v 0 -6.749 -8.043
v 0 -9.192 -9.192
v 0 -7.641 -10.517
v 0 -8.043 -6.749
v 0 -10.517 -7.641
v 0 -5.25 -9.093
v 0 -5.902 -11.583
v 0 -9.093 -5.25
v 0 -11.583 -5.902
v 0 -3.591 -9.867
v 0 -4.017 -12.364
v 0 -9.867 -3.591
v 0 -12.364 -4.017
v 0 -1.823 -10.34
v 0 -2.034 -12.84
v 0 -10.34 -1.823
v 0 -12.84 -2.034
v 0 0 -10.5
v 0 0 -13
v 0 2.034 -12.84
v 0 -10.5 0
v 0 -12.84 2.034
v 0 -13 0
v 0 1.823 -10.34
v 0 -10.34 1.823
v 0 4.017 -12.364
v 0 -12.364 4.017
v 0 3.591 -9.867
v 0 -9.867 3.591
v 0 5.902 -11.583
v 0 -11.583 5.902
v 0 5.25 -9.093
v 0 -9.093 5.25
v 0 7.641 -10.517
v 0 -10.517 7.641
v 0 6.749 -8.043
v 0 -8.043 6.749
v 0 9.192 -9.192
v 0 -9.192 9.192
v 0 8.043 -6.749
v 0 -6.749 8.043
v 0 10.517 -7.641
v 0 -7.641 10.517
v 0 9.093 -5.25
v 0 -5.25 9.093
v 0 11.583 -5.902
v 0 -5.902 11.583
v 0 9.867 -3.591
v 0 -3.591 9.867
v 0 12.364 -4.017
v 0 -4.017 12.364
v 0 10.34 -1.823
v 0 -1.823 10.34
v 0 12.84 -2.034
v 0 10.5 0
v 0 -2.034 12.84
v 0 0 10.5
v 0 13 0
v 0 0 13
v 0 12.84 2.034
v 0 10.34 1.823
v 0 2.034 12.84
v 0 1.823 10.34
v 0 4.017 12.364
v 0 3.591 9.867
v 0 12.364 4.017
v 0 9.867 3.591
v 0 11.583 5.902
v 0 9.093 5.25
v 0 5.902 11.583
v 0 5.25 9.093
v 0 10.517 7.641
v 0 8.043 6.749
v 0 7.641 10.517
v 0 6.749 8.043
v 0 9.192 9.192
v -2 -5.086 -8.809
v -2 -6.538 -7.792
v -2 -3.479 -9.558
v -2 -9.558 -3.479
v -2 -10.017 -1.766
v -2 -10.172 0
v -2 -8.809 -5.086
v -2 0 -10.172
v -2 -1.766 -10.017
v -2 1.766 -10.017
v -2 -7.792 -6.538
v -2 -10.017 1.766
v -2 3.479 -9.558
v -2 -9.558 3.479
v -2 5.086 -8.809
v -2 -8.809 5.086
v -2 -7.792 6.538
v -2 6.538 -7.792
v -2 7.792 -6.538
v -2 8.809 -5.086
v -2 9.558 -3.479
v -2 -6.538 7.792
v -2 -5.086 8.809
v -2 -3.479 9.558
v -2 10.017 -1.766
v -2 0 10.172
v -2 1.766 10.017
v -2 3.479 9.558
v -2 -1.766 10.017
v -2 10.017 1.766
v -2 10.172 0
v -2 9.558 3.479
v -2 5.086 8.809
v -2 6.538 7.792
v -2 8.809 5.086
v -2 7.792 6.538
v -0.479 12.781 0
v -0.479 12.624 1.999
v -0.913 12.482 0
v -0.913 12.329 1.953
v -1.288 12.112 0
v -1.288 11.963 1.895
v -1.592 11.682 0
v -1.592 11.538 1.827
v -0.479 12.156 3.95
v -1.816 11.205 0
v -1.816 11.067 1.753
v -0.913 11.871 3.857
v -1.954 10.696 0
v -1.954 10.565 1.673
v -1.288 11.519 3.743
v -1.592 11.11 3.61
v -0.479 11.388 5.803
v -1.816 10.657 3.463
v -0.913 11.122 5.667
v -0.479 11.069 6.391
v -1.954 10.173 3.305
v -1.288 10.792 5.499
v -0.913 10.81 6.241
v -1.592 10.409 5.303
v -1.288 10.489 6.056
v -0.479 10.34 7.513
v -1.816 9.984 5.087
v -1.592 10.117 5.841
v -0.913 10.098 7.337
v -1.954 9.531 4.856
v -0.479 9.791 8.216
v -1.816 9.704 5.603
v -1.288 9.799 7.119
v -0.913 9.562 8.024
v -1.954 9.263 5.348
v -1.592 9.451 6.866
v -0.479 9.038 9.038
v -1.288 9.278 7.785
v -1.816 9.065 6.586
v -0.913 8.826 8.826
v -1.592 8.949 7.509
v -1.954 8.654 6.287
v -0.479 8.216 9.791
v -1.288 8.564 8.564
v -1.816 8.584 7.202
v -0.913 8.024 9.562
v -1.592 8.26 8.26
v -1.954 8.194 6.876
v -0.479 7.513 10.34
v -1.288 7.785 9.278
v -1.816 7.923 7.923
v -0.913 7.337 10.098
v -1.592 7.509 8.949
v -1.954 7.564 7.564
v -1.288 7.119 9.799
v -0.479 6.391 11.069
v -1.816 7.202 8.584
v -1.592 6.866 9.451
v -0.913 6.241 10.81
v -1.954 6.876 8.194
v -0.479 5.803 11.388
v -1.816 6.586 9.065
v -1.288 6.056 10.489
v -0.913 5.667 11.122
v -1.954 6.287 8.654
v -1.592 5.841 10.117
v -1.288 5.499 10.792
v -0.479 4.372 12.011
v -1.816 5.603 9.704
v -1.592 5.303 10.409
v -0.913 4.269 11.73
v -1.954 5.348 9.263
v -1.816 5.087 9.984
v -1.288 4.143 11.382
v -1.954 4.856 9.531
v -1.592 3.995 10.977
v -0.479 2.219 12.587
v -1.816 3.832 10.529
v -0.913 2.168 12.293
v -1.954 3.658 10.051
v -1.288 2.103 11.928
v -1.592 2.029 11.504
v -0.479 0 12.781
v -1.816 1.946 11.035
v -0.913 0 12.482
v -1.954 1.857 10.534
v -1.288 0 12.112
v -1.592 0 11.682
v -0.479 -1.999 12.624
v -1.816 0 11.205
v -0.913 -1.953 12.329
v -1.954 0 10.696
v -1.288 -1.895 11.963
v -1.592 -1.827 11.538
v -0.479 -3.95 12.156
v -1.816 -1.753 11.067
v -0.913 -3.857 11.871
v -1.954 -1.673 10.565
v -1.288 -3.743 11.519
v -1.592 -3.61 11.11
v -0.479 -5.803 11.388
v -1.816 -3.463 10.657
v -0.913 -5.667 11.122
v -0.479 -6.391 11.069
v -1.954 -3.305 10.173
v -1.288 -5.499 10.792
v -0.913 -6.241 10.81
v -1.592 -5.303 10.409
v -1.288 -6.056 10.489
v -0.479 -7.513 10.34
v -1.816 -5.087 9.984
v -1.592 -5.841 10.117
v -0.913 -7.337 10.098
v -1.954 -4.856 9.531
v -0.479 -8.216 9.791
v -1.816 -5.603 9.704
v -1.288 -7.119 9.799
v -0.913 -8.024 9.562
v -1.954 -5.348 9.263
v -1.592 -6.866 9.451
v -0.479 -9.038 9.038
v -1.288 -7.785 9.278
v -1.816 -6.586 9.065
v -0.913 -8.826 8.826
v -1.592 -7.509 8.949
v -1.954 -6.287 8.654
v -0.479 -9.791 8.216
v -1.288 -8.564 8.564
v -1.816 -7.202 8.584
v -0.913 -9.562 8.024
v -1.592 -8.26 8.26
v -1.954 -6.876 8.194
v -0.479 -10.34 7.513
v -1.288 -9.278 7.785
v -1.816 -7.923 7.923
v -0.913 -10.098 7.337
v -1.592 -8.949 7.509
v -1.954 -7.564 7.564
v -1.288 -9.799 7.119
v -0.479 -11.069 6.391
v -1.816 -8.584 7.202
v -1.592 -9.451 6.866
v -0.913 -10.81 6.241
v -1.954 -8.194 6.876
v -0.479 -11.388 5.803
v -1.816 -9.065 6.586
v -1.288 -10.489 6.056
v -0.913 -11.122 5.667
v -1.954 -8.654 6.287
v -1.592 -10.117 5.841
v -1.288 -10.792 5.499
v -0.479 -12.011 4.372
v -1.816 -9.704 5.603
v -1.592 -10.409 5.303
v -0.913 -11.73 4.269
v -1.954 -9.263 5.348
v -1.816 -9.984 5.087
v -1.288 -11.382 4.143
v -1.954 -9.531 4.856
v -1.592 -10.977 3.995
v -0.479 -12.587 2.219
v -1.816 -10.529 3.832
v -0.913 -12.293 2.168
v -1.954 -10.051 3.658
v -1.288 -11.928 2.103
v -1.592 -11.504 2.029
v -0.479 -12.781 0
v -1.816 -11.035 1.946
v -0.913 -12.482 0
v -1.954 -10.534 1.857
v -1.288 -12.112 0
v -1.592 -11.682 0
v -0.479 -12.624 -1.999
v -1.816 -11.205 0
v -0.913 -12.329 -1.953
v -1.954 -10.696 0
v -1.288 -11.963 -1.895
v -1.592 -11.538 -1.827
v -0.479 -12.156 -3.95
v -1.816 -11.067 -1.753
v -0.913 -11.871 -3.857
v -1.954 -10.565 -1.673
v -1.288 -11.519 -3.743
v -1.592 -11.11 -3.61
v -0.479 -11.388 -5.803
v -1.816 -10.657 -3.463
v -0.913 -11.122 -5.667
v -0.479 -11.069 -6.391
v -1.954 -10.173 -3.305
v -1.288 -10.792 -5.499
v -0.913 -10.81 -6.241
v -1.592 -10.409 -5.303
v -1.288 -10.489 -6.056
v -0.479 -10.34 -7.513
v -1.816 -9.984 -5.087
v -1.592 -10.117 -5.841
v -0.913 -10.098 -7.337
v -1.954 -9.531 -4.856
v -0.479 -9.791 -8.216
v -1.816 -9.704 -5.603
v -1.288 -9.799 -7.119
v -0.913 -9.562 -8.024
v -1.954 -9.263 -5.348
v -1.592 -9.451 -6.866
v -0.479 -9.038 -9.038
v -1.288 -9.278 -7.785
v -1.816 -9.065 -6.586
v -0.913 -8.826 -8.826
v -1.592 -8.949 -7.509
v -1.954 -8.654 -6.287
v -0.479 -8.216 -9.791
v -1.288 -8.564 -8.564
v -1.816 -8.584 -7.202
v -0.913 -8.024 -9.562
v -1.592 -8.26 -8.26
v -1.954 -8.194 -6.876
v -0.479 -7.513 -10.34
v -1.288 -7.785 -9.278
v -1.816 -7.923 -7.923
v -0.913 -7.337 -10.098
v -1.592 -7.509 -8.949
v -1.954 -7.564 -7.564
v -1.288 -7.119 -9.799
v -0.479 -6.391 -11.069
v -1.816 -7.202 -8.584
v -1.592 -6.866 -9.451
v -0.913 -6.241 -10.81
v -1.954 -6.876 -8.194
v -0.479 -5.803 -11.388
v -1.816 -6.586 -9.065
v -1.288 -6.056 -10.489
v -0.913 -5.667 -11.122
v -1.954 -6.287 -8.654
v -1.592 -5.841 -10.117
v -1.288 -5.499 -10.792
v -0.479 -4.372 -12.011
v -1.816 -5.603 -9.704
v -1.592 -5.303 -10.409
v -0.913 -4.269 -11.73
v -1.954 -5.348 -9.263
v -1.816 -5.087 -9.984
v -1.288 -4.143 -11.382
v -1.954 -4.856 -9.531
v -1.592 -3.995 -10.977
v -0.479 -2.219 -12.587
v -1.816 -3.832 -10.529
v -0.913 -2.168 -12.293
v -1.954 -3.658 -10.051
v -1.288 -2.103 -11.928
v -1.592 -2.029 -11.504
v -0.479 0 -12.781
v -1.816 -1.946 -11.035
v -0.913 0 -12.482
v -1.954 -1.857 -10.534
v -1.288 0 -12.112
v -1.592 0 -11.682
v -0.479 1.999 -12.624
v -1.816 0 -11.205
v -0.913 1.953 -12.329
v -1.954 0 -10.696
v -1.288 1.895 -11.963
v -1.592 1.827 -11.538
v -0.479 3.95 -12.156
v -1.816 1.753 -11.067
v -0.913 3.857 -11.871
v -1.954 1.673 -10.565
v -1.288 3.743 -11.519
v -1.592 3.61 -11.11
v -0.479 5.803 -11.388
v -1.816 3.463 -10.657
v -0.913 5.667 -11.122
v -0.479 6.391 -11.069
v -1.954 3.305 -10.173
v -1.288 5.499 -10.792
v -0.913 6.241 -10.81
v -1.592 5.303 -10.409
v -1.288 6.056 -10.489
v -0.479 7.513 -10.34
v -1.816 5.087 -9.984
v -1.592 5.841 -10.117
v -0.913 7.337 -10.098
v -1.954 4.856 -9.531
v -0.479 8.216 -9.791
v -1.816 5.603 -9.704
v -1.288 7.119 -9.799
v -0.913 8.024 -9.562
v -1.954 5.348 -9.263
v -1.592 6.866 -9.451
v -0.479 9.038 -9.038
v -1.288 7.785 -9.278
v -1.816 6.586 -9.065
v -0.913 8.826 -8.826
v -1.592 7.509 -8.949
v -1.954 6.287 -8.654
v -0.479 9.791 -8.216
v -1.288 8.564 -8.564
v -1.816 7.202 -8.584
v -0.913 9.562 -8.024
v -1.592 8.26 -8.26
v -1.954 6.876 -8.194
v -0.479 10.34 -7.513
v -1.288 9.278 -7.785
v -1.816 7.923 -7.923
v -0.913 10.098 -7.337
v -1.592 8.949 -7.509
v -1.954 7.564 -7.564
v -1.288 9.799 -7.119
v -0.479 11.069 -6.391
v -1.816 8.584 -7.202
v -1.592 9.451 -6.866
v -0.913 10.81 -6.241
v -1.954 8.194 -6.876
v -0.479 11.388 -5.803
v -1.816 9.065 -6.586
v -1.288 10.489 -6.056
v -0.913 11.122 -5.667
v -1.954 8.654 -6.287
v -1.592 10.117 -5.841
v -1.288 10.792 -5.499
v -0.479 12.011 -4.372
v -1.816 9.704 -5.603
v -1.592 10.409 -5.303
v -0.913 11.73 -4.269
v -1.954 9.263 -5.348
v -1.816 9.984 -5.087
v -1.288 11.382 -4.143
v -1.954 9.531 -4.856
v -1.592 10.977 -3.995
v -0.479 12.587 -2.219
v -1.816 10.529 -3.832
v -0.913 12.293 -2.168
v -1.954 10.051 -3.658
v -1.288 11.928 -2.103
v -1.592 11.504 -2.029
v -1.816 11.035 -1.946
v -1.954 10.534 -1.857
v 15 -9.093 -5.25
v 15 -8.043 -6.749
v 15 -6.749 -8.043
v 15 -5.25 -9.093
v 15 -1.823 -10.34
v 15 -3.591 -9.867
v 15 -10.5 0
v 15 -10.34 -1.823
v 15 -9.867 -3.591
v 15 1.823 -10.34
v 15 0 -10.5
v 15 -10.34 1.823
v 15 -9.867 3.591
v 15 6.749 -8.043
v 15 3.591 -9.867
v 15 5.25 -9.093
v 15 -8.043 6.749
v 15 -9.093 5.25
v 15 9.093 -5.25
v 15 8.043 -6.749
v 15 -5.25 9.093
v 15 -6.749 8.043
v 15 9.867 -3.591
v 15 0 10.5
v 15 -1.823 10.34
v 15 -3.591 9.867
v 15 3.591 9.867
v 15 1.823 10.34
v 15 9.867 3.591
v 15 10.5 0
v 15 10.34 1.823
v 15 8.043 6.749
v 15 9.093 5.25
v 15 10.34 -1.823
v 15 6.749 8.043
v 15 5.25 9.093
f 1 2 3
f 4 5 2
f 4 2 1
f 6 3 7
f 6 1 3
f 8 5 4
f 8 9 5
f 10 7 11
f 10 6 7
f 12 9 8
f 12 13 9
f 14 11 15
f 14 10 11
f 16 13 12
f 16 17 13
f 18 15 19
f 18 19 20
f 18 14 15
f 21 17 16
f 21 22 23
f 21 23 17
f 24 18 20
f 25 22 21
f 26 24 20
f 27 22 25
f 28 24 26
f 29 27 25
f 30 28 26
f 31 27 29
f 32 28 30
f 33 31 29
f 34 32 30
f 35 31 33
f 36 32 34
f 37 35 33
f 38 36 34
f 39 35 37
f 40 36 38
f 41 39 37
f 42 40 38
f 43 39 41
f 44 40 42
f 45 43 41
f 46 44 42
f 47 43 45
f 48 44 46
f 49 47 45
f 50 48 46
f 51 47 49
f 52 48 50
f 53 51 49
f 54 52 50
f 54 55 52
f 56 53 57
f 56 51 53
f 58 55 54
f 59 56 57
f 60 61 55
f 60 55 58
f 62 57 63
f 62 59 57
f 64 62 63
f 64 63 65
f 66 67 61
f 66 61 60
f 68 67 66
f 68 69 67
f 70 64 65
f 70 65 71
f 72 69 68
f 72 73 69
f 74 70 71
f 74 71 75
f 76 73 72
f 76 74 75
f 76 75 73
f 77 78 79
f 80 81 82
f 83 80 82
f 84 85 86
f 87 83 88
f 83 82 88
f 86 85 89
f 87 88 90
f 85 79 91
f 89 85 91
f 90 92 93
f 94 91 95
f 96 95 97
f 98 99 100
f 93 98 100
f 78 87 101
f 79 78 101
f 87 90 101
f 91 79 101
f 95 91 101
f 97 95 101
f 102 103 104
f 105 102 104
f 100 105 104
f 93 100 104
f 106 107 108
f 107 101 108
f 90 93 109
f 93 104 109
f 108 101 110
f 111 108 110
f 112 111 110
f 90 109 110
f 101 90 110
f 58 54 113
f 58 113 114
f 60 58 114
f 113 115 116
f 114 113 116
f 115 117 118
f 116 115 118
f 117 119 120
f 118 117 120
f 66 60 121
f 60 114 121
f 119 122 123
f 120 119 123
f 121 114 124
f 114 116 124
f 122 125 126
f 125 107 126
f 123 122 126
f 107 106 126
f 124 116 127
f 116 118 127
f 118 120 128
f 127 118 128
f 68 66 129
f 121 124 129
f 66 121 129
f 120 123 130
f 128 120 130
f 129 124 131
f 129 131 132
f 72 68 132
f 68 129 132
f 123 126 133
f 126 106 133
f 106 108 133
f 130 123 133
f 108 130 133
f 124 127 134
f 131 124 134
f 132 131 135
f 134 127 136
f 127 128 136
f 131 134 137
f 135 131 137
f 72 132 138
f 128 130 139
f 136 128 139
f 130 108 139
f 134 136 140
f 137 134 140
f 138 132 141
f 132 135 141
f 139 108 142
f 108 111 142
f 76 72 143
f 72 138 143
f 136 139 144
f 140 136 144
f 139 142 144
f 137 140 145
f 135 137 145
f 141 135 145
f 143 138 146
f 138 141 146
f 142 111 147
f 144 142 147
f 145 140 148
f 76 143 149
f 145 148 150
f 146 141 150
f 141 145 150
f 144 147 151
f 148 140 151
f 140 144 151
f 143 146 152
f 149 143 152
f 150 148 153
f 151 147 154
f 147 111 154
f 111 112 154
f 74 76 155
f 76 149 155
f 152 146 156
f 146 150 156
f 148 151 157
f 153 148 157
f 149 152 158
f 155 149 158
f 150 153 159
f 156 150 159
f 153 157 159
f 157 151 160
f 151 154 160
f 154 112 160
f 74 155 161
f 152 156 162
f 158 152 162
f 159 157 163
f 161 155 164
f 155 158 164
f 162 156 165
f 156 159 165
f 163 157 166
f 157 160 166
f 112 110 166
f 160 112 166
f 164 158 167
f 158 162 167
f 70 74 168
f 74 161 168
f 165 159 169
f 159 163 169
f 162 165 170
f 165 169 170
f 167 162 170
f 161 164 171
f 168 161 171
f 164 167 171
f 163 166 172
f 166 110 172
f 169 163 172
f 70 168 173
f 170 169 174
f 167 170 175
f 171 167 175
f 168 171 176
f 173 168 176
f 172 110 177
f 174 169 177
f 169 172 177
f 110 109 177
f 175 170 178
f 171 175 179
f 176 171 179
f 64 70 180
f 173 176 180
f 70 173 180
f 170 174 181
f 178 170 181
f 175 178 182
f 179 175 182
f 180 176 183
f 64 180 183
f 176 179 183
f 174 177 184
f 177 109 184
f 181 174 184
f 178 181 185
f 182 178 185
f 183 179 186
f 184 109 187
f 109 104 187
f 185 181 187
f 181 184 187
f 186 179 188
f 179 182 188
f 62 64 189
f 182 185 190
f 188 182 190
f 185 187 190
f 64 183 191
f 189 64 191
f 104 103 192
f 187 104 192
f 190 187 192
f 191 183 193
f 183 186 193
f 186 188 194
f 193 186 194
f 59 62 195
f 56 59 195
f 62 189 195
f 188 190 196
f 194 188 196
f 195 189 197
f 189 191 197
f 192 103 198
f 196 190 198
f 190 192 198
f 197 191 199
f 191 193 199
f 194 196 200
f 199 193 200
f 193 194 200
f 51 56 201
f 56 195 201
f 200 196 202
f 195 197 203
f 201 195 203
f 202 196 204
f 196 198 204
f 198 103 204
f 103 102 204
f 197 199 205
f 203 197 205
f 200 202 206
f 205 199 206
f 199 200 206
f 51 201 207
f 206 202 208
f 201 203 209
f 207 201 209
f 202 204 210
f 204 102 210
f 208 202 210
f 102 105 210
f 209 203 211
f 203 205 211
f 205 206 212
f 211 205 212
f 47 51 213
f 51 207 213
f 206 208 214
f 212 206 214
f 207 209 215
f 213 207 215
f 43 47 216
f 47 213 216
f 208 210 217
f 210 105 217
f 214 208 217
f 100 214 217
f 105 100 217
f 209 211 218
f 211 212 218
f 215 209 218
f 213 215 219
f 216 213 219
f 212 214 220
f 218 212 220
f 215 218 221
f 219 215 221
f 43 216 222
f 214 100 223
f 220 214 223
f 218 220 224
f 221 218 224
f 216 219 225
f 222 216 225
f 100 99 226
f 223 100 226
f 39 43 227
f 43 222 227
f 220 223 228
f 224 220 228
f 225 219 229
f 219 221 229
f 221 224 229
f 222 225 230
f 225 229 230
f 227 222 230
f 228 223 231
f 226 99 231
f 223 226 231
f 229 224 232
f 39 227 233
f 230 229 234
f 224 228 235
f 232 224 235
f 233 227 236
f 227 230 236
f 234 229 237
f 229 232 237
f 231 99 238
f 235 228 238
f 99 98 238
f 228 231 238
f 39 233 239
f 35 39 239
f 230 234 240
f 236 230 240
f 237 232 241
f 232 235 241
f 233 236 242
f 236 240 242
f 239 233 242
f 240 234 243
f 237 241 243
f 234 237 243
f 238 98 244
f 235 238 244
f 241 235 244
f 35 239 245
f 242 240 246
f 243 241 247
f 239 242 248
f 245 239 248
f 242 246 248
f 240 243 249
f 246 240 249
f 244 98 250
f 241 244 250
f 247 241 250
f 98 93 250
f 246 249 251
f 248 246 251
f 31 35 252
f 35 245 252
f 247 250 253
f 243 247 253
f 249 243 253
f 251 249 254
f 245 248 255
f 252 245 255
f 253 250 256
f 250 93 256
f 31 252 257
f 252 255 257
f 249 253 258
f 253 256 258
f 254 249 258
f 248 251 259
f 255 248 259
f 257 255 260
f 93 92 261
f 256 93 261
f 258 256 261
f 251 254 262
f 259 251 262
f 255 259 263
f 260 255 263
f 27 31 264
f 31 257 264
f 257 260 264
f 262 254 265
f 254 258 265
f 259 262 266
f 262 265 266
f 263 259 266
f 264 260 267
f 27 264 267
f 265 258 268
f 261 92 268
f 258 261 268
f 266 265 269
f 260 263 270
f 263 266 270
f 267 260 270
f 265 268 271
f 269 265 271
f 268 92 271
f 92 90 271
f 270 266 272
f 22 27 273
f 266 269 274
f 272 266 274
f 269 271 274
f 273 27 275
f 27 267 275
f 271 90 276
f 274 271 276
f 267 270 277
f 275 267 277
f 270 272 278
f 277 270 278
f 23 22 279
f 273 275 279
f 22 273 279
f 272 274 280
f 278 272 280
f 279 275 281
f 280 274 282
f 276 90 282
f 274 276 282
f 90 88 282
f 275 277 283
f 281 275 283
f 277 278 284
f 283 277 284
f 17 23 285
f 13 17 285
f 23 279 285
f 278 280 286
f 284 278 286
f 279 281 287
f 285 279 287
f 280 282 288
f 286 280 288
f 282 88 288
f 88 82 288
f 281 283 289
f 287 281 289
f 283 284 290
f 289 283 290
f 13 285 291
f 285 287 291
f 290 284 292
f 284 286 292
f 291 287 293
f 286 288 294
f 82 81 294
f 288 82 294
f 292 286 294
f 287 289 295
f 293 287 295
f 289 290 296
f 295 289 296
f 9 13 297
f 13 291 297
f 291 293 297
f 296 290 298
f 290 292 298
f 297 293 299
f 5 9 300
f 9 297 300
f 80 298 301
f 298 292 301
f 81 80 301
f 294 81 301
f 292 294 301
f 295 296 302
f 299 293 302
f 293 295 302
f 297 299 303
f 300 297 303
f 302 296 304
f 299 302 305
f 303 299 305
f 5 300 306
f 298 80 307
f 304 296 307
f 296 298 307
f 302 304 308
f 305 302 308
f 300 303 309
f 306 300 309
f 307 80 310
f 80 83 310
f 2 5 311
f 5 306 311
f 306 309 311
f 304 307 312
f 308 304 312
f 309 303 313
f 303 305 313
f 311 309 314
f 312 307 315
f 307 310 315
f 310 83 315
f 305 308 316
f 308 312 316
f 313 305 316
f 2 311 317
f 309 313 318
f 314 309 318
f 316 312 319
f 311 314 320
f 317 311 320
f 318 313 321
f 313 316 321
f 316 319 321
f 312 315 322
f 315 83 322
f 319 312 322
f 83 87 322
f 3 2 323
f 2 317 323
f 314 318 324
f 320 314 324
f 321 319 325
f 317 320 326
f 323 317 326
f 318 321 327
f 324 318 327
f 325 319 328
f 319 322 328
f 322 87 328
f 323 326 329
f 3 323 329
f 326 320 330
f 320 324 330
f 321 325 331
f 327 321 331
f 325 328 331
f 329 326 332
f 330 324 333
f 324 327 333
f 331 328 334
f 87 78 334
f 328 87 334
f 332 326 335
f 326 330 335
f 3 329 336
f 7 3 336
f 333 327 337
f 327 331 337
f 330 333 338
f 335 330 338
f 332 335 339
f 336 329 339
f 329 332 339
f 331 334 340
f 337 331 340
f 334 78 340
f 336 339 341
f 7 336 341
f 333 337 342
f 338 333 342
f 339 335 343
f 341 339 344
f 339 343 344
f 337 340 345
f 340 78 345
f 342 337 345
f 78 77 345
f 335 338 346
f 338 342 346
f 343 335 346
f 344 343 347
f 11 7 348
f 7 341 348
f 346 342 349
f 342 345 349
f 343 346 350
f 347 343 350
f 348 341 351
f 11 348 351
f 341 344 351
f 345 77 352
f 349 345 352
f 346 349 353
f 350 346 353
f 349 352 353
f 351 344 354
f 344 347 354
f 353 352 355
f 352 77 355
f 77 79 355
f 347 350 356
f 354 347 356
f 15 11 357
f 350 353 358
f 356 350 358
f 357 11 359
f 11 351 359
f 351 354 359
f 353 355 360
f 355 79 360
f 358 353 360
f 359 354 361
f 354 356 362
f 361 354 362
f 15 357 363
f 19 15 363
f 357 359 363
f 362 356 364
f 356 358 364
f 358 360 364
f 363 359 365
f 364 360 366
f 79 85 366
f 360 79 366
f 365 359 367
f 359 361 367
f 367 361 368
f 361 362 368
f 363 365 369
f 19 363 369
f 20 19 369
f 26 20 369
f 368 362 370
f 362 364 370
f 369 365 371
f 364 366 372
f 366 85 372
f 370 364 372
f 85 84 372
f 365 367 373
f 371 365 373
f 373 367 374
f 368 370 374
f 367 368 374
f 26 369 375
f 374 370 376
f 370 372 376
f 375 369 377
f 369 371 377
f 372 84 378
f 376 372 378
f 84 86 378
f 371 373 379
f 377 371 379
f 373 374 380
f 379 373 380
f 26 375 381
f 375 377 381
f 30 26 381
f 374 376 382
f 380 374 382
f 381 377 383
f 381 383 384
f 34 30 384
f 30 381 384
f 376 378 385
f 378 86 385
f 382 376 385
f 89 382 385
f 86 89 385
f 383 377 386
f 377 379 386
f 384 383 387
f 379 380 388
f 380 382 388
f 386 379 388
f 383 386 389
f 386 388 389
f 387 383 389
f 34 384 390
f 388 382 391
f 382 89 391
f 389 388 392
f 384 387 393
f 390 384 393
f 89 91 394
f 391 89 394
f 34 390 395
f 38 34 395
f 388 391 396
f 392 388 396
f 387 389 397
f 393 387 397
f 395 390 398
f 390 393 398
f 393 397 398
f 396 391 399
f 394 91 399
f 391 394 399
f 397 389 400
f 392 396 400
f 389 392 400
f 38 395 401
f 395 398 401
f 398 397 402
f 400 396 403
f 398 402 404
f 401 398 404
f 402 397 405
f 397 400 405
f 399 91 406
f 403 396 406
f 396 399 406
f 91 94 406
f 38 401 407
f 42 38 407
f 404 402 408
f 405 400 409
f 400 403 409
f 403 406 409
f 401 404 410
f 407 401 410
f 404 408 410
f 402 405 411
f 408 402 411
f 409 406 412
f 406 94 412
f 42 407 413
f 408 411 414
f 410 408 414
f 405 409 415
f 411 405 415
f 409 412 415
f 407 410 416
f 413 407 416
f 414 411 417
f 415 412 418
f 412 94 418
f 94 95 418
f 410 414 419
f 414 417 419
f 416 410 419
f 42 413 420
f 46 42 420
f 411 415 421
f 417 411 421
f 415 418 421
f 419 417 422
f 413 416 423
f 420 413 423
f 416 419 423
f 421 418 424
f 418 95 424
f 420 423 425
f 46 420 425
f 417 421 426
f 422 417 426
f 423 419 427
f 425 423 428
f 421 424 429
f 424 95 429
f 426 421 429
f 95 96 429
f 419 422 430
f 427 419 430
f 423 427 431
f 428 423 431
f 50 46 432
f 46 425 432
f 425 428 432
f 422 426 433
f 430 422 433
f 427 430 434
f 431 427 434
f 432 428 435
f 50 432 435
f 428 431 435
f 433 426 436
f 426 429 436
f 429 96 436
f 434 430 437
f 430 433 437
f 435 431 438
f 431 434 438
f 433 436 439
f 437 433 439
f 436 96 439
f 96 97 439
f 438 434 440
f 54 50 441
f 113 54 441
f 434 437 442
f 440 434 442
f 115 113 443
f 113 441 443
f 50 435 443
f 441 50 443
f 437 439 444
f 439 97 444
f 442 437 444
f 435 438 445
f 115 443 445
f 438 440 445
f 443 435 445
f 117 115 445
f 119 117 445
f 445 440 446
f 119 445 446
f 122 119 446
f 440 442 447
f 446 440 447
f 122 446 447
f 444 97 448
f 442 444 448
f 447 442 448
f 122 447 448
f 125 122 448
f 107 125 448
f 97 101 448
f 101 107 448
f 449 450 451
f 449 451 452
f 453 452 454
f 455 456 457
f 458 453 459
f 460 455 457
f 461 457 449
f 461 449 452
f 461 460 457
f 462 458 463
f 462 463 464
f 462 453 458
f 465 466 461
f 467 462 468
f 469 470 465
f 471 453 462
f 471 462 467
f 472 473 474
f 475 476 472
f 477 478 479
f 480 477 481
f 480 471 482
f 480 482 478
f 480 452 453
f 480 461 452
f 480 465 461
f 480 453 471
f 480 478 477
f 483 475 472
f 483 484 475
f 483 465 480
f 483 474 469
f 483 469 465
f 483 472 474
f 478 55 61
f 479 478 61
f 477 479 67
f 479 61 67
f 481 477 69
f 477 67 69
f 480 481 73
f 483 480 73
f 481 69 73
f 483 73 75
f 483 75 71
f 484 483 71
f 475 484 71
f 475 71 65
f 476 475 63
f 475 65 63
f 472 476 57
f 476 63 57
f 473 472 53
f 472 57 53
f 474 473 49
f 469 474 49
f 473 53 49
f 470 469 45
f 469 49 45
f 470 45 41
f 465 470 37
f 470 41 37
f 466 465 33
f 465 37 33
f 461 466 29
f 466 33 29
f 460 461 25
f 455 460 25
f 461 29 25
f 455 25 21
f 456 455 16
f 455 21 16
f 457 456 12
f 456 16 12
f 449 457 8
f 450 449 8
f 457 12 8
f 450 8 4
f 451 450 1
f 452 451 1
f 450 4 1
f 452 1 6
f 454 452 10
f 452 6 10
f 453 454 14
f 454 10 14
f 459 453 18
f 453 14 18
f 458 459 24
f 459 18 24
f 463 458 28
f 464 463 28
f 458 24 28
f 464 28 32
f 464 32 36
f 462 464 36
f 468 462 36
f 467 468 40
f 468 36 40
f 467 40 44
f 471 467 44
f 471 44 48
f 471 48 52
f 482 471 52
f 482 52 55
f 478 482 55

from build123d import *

# Parameters (mm, degrees)
F1_R     = 10.5
F2_DEPTH = 15
F3_R     = 13
F4_DEPTH = 2


# Not quite as in the source:
# - a fillet or chamfer that OpenCascade refuses, or shapes differently, is made with other operations: its cross-section is extruded or revolved along the edge and cut away or added


with BuildPart() as f2:
    # F1 (on face) → F2 (new body)
    with BuildSketch(Plane.YZ):
        Circle(F1_R)
    extrude(amount=F2_DEPTH)

    # F3 (on face) → F4 (join)
    with BuildSketch(Plane.YZ):
        Circle(F3_R)
    extrude(amount=-F4_DEPTH)

    # F5: fillet of radius 3 on 1 edges, made by hand

    # F5_s1 → F5_t2 (revolve, cut)
    with BuildSketch(Plane.XY):
        with BuildLine():
            ThreePointArc((0, 13), (-1.4494897428, 11.9036236828), (-2, 10.1715728753))
            Line((-2, 10.1715728753), (-2, 13))
            Line((-2, 13), (0, 13))
        make_face()
    revolve(axis=Axis((-2, 0, 0), (1, 0, 0)), mode=Mode.SUBTRACT)


solid = f2.part
